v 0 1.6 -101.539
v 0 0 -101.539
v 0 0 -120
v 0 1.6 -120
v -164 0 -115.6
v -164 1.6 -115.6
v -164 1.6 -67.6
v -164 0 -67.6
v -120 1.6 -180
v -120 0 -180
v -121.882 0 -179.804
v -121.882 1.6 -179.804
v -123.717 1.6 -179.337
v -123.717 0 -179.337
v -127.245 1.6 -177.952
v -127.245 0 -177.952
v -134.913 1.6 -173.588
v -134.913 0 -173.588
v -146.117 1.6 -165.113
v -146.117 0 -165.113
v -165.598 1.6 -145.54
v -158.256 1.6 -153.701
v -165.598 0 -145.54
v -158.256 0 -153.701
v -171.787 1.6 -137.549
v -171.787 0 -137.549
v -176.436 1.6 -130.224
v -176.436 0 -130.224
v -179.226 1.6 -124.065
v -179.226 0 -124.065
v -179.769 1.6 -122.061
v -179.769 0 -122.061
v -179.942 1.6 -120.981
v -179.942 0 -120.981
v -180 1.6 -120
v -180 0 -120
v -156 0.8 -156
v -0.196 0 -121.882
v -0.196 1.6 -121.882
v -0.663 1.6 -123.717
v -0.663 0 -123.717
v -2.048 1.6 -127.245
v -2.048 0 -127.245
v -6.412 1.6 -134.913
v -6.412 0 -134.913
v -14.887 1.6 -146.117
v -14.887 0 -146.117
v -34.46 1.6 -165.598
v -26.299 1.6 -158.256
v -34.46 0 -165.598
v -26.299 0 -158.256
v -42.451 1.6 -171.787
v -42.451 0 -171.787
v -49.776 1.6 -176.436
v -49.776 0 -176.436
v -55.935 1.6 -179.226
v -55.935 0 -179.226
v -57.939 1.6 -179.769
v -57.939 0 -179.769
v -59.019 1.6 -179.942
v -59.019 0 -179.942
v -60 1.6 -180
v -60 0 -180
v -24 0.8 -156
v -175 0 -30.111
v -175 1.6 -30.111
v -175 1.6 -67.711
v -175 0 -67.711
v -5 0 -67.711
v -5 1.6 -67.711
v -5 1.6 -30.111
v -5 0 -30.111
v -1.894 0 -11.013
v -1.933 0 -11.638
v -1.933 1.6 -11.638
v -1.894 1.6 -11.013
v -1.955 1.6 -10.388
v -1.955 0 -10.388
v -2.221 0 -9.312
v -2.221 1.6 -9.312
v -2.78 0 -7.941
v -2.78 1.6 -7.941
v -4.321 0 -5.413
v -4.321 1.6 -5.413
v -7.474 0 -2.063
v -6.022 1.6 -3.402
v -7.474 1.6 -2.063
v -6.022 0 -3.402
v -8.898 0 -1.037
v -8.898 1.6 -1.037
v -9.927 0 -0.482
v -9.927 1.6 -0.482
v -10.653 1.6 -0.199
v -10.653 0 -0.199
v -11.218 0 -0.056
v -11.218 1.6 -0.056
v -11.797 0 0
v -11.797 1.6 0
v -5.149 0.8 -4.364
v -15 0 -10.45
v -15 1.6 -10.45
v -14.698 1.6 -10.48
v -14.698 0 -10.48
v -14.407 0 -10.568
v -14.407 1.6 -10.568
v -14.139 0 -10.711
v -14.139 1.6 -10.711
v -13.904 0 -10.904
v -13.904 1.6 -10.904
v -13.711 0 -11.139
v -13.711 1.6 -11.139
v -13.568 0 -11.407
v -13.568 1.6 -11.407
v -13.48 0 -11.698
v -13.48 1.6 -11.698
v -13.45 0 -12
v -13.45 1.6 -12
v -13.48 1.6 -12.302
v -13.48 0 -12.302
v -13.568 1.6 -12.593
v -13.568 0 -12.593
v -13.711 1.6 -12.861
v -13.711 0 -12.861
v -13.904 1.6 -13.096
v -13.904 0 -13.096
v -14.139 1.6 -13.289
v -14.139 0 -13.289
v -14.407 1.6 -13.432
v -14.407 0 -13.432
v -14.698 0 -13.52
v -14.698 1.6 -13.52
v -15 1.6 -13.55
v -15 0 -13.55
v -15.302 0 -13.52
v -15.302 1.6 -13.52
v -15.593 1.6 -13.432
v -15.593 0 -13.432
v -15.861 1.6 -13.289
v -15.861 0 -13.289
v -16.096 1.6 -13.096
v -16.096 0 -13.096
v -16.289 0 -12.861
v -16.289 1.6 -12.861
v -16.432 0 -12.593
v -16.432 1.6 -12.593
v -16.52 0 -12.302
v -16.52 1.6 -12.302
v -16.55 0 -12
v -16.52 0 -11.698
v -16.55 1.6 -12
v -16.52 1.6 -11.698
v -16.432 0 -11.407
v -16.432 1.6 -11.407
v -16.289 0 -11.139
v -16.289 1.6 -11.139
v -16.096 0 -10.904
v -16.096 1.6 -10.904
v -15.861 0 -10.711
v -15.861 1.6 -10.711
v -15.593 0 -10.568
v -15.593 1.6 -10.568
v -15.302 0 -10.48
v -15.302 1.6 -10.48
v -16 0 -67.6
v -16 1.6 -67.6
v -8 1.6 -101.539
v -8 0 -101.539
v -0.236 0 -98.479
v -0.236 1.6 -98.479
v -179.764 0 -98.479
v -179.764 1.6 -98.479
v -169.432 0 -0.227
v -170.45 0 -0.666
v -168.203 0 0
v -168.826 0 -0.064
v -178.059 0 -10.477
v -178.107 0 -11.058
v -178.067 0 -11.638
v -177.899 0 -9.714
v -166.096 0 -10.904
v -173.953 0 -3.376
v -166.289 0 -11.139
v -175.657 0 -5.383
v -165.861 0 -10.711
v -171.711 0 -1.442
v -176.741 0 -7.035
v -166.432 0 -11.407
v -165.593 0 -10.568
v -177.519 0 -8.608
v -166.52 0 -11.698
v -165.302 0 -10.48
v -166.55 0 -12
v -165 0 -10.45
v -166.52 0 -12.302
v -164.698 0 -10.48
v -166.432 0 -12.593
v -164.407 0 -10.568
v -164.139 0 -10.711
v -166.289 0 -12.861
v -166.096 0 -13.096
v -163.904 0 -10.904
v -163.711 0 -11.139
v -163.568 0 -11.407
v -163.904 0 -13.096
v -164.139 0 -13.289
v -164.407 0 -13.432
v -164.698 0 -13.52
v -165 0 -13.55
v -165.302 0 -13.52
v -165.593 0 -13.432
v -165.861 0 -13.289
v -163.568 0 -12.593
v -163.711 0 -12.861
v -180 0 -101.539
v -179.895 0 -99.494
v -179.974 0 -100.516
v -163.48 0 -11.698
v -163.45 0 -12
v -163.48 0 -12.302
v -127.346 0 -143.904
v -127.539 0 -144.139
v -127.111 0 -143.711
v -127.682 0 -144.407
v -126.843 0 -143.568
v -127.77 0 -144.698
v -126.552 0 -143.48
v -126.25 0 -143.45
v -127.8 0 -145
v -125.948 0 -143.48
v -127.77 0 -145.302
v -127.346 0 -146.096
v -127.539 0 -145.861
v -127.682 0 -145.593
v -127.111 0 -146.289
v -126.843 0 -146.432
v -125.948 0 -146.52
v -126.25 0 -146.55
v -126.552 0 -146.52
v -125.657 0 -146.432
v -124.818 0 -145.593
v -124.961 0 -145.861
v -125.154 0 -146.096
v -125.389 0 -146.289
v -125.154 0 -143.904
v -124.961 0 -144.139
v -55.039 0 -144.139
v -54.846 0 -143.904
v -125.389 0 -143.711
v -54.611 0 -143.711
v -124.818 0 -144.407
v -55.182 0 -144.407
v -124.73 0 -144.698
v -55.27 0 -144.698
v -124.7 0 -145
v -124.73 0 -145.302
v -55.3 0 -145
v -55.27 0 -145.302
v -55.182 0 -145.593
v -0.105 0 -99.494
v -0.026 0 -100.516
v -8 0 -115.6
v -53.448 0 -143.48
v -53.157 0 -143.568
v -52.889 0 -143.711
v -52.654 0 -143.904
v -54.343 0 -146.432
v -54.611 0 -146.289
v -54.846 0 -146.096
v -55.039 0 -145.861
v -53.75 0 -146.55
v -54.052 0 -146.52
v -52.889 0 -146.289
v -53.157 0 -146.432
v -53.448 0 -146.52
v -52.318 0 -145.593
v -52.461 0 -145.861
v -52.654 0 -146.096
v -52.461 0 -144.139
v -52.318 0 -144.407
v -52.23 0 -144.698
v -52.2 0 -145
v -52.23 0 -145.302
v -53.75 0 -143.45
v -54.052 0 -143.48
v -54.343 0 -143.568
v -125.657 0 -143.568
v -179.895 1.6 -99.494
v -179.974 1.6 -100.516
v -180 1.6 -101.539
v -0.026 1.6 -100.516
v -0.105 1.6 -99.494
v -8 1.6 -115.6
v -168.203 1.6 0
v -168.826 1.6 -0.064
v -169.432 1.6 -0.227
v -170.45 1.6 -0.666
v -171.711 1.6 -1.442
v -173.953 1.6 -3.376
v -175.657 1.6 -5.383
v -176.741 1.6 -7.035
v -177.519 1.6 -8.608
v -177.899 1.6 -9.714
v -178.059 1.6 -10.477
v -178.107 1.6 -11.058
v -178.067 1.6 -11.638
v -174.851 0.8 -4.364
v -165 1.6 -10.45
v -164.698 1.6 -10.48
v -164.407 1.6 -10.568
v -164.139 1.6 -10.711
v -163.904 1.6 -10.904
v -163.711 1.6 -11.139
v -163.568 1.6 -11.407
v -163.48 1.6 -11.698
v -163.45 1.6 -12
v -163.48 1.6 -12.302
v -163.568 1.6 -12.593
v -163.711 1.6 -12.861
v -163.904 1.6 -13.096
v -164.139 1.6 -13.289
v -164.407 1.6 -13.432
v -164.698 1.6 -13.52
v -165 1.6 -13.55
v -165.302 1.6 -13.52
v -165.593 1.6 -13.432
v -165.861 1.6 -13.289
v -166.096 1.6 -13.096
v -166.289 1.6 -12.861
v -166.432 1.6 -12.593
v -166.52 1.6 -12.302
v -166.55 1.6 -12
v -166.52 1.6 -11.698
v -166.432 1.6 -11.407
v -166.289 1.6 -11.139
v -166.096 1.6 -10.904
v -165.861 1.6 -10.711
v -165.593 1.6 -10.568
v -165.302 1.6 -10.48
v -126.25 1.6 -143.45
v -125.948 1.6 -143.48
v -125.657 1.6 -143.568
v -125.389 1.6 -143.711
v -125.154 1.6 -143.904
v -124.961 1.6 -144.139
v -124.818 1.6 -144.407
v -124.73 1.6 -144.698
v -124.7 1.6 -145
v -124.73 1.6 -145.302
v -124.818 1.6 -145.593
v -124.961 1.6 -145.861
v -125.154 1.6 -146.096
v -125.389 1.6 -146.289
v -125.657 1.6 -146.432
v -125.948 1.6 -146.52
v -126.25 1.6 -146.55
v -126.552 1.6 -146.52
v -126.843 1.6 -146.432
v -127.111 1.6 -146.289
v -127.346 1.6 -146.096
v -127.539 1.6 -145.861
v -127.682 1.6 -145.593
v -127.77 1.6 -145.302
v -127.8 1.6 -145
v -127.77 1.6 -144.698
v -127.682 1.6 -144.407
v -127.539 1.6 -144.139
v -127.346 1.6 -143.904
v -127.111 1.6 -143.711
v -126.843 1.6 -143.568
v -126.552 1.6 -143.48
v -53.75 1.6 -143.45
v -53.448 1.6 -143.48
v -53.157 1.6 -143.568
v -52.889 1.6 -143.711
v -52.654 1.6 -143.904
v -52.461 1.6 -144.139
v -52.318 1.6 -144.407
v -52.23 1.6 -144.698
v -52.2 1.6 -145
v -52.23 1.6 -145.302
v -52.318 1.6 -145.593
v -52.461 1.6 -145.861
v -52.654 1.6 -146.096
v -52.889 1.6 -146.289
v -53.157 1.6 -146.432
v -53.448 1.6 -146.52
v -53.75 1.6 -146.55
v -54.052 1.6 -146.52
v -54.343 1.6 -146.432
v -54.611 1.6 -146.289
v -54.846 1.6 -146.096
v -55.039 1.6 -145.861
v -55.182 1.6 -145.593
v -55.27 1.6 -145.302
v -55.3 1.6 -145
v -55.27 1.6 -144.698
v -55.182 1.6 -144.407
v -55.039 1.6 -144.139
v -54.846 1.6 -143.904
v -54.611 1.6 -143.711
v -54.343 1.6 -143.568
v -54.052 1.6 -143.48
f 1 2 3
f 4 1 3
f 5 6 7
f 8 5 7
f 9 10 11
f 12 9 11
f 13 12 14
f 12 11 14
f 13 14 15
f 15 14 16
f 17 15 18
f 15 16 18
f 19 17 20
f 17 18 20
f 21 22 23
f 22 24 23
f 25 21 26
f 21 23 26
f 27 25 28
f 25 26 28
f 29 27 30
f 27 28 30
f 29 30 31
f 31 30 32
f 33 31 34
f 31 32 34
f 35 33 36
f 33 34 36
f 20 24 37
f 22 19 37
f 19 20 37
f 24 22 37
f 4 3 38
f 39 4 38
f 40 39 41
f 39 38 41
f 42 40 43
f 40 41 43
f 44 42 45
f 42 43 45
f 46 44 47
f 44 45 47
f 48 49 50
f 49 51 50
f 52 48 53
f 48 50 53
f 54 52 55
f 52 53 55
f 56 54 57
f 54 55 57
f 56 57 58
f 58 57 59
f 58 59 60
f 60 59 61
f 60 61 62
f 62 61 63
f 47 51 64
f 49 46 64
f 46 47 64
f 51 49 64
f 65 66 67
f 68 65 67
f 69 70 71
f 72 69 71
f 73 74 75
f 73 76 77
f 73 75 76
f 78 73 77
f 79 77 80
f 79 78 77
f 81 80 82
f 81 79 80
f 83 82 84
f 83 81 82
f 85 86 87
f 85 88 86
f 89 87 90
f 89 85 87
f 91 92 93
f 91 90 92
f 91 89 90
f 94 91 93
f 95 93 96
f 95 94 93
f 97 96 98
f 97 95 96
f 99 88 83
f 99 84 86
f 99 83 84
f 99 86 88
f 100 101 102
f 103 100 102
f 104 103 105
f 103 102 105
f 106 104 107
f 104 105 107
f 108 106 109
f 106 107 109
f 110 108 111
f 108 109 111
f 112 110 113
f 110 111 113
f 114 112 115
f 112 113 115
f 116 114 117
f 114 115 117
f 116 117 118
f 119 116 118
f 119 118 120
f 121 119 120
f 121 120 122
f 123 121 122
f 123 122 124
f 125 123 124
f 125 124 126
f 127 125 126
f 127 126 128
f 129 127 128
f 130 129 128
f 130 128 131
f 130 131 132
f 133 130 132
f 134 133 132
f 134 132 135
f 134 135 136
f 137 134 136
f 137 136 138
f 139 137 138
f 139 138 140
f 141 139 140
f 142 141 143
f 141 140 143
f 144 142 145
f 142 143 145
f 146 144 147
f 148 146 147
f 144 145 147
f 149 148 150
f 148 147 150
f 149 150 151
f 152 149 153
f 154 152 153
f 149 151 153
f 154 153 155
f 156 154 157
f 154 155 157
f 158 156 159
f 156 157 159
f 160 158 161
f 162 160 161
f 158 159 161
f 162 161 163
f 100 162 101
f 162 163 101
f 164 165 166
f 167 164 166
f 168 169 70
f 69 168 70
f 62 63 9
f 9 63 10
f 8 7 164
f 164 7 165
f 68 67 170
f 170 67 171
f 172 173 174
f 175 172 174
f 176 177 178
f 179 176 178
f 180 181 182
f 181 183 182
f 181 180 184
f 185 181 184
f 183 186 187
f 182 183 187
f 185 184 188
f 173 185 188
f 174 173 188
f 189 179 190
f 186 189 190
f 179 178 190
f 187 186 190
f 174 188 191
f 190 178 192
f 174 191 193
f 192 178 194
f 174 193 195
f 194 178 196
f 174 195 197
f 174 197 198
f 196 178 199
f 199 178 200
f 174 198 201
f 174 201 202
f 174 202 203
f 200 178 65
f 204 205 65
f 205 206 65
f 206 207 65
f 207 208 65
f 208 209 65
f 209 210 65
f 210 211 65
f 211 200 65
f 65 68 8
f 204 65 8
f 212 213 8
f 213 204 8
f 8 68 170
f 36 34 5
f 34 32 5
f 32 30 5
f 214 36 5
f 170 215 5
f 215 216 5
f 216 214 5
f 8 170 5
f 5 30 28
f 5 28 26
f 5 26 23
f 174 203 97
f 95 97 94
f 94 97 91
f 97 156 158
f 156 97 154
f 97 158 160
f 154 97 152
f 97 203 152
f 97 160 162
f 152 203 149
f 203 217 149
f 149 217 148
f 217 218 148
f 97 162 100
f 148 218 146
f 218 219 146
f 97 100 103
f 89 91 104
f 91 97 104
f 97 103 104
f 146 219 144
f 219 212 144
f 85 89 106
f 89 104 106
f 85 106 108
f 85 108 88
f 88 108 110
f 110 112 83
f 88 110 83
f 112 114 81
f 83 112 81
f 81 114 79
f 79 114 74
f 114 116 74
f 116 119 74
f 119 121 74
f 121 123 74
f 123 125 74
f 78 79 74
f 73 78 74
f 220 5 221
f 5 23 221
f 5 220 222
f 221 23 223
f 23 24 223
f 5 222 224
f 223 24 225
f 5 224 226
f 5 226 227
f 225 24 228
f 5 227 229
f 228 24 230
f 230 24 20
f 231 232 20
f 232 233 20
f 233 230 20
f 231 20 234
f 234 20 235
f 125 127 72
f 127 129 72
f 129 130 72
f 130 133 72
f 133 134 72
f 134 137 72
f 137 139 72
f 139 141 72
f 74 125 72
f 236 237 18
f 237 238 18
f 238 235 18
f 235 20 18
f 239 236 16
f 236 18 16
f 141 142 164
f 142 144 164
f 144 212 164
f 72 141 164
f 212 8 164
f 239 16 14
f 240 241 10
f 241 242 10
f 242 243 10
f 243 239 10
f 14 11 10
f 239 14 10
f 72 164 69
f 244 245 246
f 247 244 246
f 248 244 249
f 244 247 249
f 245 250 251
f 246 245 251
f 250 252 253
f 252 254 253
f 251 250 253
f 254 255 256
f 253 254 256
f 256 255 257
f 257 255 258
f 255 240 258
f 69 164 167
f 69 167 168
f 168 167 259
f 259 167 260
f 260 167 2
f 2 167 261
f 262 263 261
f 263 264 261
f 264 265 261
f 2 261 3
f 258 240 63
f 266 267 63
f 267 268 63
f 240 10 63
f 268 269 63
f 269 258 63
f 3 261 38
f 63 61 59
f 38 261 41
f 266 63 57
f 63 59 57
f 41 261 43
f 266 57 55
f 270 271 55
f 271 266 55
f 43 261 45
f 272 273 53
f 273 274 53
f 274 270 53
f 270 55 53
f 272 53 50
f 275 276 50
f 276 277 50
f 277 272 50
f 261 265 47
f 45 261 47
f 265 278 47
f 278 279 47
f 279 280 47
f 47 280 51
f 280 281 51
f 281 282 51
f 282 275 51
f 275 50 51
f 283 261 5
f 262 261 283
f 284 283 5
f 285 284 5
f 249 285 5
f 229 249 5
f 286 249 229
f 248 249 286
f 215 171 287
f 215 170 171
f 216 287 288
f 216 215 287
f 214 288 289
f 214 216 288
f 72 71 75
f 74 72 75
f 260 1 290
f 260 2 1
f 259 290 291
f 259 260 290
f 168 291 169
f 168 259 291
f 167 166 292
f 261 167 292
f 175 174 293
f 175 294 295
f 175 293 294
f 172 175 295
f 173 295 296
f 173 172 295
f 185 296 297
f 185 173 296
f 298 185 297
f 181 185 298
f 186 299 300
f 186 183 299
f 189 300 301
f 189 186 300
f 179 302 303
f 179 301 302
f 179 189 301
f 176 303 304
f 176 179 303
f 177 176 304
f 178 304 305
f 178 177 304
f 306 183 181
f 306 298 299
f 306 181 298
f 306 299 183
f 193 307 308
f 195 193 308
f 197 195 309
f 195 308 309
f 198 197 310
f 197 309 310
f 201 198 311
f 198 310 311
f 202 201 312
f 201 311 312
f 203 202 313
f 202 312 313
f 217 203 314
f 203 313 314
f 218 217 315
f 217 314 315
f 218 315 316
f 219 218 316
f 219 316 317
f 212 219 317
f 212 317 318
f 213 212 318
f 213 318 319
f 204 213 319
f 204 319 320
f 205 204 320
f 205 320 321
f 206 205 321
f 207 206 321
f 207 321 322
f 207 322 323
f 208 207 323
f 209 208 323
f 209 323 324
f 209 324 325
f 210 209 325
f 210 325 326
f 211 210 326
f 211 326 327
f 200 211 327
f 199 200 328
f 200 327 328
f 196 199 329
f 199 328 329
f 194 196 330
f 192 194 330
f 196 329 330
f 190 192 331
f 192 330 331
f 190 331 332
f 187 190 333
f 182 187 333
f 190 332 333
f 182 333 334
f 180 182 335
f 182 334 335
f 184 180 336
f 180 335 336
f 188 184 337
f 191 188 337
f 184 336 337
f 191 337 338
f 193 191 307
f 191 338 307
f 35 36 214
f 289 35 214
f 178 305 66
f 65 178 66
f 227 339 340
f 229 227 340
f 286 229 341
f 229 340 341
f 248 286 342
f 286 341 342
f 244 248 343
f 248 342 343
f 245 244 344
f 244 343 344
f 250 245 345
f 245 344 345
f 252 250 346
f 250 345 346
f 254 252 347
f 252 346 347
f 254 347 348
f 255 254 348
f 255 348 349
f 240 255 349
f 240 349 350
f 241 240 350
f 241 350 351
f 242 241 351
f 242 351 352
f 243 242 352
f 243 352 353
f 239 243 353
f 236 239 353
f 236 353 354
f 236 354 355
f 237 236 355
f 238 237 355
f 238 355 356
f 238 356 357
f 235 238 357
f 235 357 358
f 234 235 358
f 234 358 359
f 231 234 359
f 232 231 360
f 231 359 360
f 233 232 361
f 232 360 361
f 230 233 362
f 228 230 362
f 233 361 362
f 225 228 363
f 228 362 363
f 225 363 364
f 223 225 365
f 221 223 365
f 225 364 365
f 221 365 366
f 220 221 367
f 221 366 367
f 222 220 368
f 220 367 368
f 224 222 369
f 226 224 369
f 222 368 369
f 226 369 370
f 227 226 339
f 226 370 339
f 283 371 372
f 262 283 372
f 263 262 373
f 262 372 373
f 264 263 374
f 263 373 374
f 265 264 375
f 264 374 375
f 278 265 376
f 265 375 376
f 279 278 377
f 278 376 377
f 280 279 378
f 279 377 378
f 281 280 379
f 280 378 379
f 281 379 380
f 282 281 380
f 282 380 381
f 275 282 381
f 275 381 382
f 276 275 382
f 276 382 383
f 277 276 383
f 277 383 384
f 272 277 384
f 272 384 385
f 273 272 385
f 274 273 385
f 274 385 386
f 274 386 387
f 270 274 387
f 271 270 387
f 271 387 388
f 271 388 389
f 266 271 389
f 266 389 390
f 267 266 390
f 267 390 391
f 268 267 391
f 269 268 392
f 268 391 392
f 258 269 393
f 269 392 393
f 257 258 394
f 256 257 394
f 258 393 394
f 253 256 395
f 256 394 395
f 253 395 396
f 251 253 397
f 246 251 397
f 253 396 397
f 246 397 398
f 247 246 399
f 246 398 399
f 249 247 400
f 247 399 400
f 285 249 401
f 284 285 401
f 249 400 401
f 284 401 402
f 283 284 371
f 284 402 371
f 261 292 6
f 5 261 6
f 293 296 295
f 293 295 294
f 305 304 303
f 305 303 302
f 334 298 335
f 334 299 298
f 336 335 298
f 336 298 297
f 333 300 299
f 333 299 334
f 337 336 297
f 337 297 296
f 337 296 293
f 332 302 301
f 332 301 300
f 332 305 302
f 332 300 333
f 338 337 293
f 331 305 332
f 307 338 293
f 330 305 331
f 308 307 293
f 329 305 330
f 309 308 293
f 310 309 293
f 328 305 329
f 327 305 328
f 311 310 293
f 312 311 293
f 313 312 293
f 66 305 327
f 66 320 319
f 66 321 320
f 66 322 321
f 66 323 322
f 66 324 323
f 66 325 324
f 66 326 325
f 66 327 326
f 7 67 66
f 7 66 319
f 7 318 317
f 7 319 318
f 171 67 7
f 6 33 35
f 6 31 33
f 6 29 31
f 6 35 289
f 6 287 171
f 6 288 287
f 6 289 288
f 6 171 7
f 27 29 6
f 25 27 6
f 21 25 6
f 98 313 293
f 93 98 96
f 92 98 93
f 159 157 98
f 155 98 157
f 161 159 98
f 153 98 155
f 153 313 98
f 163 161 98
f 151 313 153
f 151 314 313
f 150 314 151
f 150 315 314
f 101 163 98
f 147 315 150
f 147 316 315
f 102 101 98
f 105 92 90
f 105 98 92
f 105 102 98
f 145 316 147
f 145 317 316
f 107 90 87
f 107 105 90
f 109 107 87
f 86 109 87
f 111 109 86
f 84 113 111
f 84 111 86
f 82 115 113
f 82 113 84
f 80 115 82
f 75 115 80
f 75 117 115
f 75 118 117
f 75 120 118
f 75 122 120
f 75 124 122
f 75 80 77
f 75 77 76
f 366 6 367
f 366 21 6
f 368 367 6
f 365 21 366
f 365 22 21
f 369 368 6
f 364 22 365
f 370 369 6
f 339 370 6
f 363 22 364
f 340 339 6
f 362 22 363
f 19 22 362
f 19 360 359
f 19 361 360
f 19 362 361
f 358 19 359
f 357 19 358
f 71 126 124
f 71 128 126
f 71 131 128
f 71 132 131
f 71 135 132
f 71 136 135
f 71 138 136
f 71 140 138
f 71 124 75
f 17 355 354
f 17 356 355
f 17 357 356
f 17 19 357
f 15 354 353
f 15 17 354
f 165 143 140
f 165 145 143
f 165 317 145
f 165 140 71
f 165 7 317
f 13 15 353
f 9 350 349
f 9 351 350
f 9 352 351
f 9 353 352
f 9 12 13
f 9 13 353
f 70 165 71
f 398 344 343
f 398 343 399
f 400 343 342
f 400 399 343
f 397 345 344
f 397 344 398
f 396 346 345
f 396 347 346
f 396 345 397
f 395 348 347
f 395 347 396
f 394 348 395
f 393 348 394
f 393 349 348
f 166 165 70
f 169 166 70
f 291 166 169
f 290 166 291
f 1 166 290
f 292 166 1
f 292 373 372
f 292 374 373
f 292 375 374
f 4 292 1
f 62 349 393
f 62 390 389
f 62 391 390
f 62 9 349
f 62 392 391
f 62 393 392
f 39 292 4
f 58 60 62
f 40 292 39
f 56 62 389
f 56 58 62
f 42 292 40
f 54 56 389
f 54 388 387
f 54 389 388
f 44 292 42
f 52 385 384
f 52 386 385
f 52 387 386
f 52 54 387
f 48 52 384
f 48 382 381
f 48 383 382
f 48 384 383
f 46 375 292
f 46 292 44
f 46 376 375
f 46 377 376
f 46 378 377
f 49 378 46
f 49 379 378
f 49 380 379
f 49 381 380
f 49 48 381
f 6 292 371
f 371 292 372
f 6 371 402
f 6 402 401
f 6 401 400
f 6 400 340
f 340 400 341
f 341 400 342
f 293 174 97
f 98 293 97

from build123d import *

# Parameters (mm, degrees)
SKETCH1_W           = 80
SKETCH1_H           = 30
SKETCH1_W_2         = 50
BOSS_EXTRUDE1_DEPTH = 1.6
FILLET1_SIZE        = 60
SKETCH6_W           = 80
SKETCH6_H           = 30
CUT_EXTRUDE1_DEPTH  = 10
FILLET3_R           = 20
CUT_EXTRUDE3_REACH  = 256.563
CUT_EXTRUDE5_REACH  = 256.563
SKETCH11_R          = 1.55


with BuildPart() as part:
    # Sketch1 → Boss-Extrude1 (new body)
    with BuildSketch(Plane(origin=(0, 0, 0), x_dir=(1, 0, 0), z_dir=(0, 1, 0))):
        with Locations((-90, -15)):
            Rectangle(SKETCH1_W, SKETCH1_H)
        Polygon((0, 180), (-180, 180), (-180, 30), (-130, 30), (-50, 30), (0, 30), align=None)
        with Locations((-25, 15)):
            Rectangle(SKETCH1_W_2, SKETCH1_H)
        with Locations((-155, 15)):
            Rectangle(SKETCH1_W_2, SKETCH1_H)
        with Locations((-90, 15)):
            Rectangle(SKETCH1_W, SKETCH1_H)
    extrude(amount=BOSS_EXTRUDE1_DEPTH)

    # Fillet1
    # a fillet whose section is not a circle: 60 mm, written as the material it takes off along each edge
    with BuildSketch(Plane(origin=(0, -150, -180), x_dir=(0, 0, 1), z_dir=(0, 1, 0)), Plane(origin=(-180, -150, -180), x_dir=(1, 0, 0), z_dir=(0, 1, 0))) as fillet1_piece_1:
        with BuildLine():
            Bezier((FILLET1_SIZE, 0), (0, 0), (0, -FILLET1_SIZE), weights=[1, 0.25, 1])
            Line((0, -FILLET1_SIZE), (0, 0))
            Line((0, 0), (FILLET1_SIZE, 0))
        make_face()
    extrude(amount=301.6, mode=Mode.SUBTRACT)

    # Sketch6 → Cut-Extrude1 (cut)
    with BuildSketch(Plane(origin=(0, 1.6, 0), x_dir=(1, 0, 0), z_dir=(0, 1, 0))):
        with Locations((-90, -15)):
            Rectangle(SKETCH6_W, SKETCH6_H)
        Polygon((-180, 100), (-180, 0), (-175, 30.1112758), (-175, 67.7112758), align=None)
        Polygon((-5, 30.1112758), (0, 0), (0, 100), (-5, 67.7112758), align=None)
    extrude(amount=-CUT_EXTRUDE1_DEPTH, mode=Mode.SUBTRACT)

    # Fillet2
    # a fillet whose section is not a circle: 10 mm, written as the material it takes off along each edge
    with BuildSketch(Plane(origin=(-180, -29.493585843, 0), x_dir=(1, 0, 0), z_dir=(0, 1, 0)), Plane(origin=(0, -29.493585843, 0), x_dir=(-0.16380778451733694, 0, -0.9864922755559323), z_dir=(0, 1, 0))) as fillet2_piece_1:
        with BuildLine():
            Bezier((11.797434337, 0), (0, 0), (1.932511582, 11.638077845), weights=[1, 0.333333333, 1])
            Line((1.932511582, 11.638077845), (0, 0))
            Line((0, 0), (11.797434337, 0))
        make_face()
    extrude(amount=60.587171687, mode=Mode.SUBTRACT)

    # Fillet3
    fillet3_edges = [part.edges().sort_by_distance(p)[0] for p in [
        (0, 0.8, -100),
        (-180, 0.8, -100),
    ]]
    fillet(fillet3_edges, radius=FILLET3_R)

    # Sketch9 → Cut-Extrude3 (cut, up to next)
    with BuildSketch(Plane(origin=(0, 1.6, 0), x_dir=(1, 0, 0), z_dir=(0, 1, 0)), mode=Mode.PRIVATE) as cut_extrude3_sk1:
        Polygon((-164, 115.6), (-164, 67.6), (-16, 67.6), (-8, 101.53935467), (-8, 115.6), align=None)
    cut_extrude3_tool1 = extrude(cut_extrude3_sk1.sketch, amount=-CUT_EXTRUDE3_REACH, mode=Mode.PRIVATE) & part.part
    add(cut_extrude3_tool1.solids().sort_by_distance((-87.391012, 1.6, -91.83426))[0], mode=Mode.SUBTRACT)

    # Sketch11 → Cut-Extrude5 (cut, up to next)
    with BuildSketch(Plane(origin=(0, 1.6, 0), x_dir=(1, 0, 0), z_dir=(0, 1, 0)), mode=Mode.PRIVATE) as cut_extrude5_sk1:
        with Locations(Location((-165, 12, 0), (0, 0, 270))):
            Circle(SKETCH11_R)
    cut_extrude5_tool1 = extrude(cut_extrude5_sk1.sketch, amount=-CUT_EXTRUDE5_REACH, mode=Mode.PRIVATE) & part.part
    # Sketch11 → Cut-Extrude5 (cut, up to next)
    with BuildSketch(Plane(origin=(0, 1.6, 0), x_dir=(1, 0, 0), z_dir=(0, 1, 0)), mode=Mode.PRIVATE) as cut_extrude5_sk2:
        with Locations(Location((-126.25, 145, 0), (0, 0, 270))):
            Circle(SKETCH11_R)
    cut_extrude5_tool2 = extrude(cut_extrude5_sk2.sketch, amount=-CUT_EXTRUDE5_REACH, mode=Mode.PRIVATE) & part.part
    # Sketch11 → Cut-Extrude5 (cut, up to next)
    with BuildSketch(Plane(origin=(0, 1.6, 0), x_dir=(1, 0, 0), z_dir=(0, 1, 0)), mode=Mode.PRIVATE) as cut_extrude5_sk3:
        with Locations(Location((-15, 12, 0), (0, 0, 270))):
            Circle(SKETCH11_R)
    cut_extrude5_tool3 = extrude(cut_extrude5_sk3.sketch, amount=-CUT_EXTRUDE5_REACH, mode=Mode.PRIVATE) & part.part
    # Sketch11 → Cut-Extrude5 (cut, up to next)
    with BuildSketch(Plane(origin=(0, 1.6, 0), x_dir=(1, 0, 0), z_dir=(0, 1, 0)), mode=Mode.PRIVATE) as cut_extrude5_sk4:
        with Locations(Location((-53.75, 145, 0), (0, 0, 270))):
            Circle(SKETCH11_R)
    cut_extrude5_tool4 = extrude(cut_extrude5_sk4.sketch, amount=-CUT_EXTRUDE5_REACH, mode=Mode.PRIVATE) & part.part
    add(cut_extrude5_tool1.solids().sort_by_distance((-165, 1.6, -12))[0], mode=Mode.SUBTRACT)
    add(cut_extrude5_tool2.solids().sort_by_distance((-126.25, 1.6, -145))[0], mode=Mode.SUBTRACT)
    add(cut_extrude5_tool3.solids().sort_by_distance((-15, 1.6, -12))[0], mode=Mode.SUBTRACT)
    add(cut_extrude5_tool4.solids().sort_by_distance((-53.75, 1.6, -145))[0], mode=Mode.SUBTRACT)


solid = part.part
